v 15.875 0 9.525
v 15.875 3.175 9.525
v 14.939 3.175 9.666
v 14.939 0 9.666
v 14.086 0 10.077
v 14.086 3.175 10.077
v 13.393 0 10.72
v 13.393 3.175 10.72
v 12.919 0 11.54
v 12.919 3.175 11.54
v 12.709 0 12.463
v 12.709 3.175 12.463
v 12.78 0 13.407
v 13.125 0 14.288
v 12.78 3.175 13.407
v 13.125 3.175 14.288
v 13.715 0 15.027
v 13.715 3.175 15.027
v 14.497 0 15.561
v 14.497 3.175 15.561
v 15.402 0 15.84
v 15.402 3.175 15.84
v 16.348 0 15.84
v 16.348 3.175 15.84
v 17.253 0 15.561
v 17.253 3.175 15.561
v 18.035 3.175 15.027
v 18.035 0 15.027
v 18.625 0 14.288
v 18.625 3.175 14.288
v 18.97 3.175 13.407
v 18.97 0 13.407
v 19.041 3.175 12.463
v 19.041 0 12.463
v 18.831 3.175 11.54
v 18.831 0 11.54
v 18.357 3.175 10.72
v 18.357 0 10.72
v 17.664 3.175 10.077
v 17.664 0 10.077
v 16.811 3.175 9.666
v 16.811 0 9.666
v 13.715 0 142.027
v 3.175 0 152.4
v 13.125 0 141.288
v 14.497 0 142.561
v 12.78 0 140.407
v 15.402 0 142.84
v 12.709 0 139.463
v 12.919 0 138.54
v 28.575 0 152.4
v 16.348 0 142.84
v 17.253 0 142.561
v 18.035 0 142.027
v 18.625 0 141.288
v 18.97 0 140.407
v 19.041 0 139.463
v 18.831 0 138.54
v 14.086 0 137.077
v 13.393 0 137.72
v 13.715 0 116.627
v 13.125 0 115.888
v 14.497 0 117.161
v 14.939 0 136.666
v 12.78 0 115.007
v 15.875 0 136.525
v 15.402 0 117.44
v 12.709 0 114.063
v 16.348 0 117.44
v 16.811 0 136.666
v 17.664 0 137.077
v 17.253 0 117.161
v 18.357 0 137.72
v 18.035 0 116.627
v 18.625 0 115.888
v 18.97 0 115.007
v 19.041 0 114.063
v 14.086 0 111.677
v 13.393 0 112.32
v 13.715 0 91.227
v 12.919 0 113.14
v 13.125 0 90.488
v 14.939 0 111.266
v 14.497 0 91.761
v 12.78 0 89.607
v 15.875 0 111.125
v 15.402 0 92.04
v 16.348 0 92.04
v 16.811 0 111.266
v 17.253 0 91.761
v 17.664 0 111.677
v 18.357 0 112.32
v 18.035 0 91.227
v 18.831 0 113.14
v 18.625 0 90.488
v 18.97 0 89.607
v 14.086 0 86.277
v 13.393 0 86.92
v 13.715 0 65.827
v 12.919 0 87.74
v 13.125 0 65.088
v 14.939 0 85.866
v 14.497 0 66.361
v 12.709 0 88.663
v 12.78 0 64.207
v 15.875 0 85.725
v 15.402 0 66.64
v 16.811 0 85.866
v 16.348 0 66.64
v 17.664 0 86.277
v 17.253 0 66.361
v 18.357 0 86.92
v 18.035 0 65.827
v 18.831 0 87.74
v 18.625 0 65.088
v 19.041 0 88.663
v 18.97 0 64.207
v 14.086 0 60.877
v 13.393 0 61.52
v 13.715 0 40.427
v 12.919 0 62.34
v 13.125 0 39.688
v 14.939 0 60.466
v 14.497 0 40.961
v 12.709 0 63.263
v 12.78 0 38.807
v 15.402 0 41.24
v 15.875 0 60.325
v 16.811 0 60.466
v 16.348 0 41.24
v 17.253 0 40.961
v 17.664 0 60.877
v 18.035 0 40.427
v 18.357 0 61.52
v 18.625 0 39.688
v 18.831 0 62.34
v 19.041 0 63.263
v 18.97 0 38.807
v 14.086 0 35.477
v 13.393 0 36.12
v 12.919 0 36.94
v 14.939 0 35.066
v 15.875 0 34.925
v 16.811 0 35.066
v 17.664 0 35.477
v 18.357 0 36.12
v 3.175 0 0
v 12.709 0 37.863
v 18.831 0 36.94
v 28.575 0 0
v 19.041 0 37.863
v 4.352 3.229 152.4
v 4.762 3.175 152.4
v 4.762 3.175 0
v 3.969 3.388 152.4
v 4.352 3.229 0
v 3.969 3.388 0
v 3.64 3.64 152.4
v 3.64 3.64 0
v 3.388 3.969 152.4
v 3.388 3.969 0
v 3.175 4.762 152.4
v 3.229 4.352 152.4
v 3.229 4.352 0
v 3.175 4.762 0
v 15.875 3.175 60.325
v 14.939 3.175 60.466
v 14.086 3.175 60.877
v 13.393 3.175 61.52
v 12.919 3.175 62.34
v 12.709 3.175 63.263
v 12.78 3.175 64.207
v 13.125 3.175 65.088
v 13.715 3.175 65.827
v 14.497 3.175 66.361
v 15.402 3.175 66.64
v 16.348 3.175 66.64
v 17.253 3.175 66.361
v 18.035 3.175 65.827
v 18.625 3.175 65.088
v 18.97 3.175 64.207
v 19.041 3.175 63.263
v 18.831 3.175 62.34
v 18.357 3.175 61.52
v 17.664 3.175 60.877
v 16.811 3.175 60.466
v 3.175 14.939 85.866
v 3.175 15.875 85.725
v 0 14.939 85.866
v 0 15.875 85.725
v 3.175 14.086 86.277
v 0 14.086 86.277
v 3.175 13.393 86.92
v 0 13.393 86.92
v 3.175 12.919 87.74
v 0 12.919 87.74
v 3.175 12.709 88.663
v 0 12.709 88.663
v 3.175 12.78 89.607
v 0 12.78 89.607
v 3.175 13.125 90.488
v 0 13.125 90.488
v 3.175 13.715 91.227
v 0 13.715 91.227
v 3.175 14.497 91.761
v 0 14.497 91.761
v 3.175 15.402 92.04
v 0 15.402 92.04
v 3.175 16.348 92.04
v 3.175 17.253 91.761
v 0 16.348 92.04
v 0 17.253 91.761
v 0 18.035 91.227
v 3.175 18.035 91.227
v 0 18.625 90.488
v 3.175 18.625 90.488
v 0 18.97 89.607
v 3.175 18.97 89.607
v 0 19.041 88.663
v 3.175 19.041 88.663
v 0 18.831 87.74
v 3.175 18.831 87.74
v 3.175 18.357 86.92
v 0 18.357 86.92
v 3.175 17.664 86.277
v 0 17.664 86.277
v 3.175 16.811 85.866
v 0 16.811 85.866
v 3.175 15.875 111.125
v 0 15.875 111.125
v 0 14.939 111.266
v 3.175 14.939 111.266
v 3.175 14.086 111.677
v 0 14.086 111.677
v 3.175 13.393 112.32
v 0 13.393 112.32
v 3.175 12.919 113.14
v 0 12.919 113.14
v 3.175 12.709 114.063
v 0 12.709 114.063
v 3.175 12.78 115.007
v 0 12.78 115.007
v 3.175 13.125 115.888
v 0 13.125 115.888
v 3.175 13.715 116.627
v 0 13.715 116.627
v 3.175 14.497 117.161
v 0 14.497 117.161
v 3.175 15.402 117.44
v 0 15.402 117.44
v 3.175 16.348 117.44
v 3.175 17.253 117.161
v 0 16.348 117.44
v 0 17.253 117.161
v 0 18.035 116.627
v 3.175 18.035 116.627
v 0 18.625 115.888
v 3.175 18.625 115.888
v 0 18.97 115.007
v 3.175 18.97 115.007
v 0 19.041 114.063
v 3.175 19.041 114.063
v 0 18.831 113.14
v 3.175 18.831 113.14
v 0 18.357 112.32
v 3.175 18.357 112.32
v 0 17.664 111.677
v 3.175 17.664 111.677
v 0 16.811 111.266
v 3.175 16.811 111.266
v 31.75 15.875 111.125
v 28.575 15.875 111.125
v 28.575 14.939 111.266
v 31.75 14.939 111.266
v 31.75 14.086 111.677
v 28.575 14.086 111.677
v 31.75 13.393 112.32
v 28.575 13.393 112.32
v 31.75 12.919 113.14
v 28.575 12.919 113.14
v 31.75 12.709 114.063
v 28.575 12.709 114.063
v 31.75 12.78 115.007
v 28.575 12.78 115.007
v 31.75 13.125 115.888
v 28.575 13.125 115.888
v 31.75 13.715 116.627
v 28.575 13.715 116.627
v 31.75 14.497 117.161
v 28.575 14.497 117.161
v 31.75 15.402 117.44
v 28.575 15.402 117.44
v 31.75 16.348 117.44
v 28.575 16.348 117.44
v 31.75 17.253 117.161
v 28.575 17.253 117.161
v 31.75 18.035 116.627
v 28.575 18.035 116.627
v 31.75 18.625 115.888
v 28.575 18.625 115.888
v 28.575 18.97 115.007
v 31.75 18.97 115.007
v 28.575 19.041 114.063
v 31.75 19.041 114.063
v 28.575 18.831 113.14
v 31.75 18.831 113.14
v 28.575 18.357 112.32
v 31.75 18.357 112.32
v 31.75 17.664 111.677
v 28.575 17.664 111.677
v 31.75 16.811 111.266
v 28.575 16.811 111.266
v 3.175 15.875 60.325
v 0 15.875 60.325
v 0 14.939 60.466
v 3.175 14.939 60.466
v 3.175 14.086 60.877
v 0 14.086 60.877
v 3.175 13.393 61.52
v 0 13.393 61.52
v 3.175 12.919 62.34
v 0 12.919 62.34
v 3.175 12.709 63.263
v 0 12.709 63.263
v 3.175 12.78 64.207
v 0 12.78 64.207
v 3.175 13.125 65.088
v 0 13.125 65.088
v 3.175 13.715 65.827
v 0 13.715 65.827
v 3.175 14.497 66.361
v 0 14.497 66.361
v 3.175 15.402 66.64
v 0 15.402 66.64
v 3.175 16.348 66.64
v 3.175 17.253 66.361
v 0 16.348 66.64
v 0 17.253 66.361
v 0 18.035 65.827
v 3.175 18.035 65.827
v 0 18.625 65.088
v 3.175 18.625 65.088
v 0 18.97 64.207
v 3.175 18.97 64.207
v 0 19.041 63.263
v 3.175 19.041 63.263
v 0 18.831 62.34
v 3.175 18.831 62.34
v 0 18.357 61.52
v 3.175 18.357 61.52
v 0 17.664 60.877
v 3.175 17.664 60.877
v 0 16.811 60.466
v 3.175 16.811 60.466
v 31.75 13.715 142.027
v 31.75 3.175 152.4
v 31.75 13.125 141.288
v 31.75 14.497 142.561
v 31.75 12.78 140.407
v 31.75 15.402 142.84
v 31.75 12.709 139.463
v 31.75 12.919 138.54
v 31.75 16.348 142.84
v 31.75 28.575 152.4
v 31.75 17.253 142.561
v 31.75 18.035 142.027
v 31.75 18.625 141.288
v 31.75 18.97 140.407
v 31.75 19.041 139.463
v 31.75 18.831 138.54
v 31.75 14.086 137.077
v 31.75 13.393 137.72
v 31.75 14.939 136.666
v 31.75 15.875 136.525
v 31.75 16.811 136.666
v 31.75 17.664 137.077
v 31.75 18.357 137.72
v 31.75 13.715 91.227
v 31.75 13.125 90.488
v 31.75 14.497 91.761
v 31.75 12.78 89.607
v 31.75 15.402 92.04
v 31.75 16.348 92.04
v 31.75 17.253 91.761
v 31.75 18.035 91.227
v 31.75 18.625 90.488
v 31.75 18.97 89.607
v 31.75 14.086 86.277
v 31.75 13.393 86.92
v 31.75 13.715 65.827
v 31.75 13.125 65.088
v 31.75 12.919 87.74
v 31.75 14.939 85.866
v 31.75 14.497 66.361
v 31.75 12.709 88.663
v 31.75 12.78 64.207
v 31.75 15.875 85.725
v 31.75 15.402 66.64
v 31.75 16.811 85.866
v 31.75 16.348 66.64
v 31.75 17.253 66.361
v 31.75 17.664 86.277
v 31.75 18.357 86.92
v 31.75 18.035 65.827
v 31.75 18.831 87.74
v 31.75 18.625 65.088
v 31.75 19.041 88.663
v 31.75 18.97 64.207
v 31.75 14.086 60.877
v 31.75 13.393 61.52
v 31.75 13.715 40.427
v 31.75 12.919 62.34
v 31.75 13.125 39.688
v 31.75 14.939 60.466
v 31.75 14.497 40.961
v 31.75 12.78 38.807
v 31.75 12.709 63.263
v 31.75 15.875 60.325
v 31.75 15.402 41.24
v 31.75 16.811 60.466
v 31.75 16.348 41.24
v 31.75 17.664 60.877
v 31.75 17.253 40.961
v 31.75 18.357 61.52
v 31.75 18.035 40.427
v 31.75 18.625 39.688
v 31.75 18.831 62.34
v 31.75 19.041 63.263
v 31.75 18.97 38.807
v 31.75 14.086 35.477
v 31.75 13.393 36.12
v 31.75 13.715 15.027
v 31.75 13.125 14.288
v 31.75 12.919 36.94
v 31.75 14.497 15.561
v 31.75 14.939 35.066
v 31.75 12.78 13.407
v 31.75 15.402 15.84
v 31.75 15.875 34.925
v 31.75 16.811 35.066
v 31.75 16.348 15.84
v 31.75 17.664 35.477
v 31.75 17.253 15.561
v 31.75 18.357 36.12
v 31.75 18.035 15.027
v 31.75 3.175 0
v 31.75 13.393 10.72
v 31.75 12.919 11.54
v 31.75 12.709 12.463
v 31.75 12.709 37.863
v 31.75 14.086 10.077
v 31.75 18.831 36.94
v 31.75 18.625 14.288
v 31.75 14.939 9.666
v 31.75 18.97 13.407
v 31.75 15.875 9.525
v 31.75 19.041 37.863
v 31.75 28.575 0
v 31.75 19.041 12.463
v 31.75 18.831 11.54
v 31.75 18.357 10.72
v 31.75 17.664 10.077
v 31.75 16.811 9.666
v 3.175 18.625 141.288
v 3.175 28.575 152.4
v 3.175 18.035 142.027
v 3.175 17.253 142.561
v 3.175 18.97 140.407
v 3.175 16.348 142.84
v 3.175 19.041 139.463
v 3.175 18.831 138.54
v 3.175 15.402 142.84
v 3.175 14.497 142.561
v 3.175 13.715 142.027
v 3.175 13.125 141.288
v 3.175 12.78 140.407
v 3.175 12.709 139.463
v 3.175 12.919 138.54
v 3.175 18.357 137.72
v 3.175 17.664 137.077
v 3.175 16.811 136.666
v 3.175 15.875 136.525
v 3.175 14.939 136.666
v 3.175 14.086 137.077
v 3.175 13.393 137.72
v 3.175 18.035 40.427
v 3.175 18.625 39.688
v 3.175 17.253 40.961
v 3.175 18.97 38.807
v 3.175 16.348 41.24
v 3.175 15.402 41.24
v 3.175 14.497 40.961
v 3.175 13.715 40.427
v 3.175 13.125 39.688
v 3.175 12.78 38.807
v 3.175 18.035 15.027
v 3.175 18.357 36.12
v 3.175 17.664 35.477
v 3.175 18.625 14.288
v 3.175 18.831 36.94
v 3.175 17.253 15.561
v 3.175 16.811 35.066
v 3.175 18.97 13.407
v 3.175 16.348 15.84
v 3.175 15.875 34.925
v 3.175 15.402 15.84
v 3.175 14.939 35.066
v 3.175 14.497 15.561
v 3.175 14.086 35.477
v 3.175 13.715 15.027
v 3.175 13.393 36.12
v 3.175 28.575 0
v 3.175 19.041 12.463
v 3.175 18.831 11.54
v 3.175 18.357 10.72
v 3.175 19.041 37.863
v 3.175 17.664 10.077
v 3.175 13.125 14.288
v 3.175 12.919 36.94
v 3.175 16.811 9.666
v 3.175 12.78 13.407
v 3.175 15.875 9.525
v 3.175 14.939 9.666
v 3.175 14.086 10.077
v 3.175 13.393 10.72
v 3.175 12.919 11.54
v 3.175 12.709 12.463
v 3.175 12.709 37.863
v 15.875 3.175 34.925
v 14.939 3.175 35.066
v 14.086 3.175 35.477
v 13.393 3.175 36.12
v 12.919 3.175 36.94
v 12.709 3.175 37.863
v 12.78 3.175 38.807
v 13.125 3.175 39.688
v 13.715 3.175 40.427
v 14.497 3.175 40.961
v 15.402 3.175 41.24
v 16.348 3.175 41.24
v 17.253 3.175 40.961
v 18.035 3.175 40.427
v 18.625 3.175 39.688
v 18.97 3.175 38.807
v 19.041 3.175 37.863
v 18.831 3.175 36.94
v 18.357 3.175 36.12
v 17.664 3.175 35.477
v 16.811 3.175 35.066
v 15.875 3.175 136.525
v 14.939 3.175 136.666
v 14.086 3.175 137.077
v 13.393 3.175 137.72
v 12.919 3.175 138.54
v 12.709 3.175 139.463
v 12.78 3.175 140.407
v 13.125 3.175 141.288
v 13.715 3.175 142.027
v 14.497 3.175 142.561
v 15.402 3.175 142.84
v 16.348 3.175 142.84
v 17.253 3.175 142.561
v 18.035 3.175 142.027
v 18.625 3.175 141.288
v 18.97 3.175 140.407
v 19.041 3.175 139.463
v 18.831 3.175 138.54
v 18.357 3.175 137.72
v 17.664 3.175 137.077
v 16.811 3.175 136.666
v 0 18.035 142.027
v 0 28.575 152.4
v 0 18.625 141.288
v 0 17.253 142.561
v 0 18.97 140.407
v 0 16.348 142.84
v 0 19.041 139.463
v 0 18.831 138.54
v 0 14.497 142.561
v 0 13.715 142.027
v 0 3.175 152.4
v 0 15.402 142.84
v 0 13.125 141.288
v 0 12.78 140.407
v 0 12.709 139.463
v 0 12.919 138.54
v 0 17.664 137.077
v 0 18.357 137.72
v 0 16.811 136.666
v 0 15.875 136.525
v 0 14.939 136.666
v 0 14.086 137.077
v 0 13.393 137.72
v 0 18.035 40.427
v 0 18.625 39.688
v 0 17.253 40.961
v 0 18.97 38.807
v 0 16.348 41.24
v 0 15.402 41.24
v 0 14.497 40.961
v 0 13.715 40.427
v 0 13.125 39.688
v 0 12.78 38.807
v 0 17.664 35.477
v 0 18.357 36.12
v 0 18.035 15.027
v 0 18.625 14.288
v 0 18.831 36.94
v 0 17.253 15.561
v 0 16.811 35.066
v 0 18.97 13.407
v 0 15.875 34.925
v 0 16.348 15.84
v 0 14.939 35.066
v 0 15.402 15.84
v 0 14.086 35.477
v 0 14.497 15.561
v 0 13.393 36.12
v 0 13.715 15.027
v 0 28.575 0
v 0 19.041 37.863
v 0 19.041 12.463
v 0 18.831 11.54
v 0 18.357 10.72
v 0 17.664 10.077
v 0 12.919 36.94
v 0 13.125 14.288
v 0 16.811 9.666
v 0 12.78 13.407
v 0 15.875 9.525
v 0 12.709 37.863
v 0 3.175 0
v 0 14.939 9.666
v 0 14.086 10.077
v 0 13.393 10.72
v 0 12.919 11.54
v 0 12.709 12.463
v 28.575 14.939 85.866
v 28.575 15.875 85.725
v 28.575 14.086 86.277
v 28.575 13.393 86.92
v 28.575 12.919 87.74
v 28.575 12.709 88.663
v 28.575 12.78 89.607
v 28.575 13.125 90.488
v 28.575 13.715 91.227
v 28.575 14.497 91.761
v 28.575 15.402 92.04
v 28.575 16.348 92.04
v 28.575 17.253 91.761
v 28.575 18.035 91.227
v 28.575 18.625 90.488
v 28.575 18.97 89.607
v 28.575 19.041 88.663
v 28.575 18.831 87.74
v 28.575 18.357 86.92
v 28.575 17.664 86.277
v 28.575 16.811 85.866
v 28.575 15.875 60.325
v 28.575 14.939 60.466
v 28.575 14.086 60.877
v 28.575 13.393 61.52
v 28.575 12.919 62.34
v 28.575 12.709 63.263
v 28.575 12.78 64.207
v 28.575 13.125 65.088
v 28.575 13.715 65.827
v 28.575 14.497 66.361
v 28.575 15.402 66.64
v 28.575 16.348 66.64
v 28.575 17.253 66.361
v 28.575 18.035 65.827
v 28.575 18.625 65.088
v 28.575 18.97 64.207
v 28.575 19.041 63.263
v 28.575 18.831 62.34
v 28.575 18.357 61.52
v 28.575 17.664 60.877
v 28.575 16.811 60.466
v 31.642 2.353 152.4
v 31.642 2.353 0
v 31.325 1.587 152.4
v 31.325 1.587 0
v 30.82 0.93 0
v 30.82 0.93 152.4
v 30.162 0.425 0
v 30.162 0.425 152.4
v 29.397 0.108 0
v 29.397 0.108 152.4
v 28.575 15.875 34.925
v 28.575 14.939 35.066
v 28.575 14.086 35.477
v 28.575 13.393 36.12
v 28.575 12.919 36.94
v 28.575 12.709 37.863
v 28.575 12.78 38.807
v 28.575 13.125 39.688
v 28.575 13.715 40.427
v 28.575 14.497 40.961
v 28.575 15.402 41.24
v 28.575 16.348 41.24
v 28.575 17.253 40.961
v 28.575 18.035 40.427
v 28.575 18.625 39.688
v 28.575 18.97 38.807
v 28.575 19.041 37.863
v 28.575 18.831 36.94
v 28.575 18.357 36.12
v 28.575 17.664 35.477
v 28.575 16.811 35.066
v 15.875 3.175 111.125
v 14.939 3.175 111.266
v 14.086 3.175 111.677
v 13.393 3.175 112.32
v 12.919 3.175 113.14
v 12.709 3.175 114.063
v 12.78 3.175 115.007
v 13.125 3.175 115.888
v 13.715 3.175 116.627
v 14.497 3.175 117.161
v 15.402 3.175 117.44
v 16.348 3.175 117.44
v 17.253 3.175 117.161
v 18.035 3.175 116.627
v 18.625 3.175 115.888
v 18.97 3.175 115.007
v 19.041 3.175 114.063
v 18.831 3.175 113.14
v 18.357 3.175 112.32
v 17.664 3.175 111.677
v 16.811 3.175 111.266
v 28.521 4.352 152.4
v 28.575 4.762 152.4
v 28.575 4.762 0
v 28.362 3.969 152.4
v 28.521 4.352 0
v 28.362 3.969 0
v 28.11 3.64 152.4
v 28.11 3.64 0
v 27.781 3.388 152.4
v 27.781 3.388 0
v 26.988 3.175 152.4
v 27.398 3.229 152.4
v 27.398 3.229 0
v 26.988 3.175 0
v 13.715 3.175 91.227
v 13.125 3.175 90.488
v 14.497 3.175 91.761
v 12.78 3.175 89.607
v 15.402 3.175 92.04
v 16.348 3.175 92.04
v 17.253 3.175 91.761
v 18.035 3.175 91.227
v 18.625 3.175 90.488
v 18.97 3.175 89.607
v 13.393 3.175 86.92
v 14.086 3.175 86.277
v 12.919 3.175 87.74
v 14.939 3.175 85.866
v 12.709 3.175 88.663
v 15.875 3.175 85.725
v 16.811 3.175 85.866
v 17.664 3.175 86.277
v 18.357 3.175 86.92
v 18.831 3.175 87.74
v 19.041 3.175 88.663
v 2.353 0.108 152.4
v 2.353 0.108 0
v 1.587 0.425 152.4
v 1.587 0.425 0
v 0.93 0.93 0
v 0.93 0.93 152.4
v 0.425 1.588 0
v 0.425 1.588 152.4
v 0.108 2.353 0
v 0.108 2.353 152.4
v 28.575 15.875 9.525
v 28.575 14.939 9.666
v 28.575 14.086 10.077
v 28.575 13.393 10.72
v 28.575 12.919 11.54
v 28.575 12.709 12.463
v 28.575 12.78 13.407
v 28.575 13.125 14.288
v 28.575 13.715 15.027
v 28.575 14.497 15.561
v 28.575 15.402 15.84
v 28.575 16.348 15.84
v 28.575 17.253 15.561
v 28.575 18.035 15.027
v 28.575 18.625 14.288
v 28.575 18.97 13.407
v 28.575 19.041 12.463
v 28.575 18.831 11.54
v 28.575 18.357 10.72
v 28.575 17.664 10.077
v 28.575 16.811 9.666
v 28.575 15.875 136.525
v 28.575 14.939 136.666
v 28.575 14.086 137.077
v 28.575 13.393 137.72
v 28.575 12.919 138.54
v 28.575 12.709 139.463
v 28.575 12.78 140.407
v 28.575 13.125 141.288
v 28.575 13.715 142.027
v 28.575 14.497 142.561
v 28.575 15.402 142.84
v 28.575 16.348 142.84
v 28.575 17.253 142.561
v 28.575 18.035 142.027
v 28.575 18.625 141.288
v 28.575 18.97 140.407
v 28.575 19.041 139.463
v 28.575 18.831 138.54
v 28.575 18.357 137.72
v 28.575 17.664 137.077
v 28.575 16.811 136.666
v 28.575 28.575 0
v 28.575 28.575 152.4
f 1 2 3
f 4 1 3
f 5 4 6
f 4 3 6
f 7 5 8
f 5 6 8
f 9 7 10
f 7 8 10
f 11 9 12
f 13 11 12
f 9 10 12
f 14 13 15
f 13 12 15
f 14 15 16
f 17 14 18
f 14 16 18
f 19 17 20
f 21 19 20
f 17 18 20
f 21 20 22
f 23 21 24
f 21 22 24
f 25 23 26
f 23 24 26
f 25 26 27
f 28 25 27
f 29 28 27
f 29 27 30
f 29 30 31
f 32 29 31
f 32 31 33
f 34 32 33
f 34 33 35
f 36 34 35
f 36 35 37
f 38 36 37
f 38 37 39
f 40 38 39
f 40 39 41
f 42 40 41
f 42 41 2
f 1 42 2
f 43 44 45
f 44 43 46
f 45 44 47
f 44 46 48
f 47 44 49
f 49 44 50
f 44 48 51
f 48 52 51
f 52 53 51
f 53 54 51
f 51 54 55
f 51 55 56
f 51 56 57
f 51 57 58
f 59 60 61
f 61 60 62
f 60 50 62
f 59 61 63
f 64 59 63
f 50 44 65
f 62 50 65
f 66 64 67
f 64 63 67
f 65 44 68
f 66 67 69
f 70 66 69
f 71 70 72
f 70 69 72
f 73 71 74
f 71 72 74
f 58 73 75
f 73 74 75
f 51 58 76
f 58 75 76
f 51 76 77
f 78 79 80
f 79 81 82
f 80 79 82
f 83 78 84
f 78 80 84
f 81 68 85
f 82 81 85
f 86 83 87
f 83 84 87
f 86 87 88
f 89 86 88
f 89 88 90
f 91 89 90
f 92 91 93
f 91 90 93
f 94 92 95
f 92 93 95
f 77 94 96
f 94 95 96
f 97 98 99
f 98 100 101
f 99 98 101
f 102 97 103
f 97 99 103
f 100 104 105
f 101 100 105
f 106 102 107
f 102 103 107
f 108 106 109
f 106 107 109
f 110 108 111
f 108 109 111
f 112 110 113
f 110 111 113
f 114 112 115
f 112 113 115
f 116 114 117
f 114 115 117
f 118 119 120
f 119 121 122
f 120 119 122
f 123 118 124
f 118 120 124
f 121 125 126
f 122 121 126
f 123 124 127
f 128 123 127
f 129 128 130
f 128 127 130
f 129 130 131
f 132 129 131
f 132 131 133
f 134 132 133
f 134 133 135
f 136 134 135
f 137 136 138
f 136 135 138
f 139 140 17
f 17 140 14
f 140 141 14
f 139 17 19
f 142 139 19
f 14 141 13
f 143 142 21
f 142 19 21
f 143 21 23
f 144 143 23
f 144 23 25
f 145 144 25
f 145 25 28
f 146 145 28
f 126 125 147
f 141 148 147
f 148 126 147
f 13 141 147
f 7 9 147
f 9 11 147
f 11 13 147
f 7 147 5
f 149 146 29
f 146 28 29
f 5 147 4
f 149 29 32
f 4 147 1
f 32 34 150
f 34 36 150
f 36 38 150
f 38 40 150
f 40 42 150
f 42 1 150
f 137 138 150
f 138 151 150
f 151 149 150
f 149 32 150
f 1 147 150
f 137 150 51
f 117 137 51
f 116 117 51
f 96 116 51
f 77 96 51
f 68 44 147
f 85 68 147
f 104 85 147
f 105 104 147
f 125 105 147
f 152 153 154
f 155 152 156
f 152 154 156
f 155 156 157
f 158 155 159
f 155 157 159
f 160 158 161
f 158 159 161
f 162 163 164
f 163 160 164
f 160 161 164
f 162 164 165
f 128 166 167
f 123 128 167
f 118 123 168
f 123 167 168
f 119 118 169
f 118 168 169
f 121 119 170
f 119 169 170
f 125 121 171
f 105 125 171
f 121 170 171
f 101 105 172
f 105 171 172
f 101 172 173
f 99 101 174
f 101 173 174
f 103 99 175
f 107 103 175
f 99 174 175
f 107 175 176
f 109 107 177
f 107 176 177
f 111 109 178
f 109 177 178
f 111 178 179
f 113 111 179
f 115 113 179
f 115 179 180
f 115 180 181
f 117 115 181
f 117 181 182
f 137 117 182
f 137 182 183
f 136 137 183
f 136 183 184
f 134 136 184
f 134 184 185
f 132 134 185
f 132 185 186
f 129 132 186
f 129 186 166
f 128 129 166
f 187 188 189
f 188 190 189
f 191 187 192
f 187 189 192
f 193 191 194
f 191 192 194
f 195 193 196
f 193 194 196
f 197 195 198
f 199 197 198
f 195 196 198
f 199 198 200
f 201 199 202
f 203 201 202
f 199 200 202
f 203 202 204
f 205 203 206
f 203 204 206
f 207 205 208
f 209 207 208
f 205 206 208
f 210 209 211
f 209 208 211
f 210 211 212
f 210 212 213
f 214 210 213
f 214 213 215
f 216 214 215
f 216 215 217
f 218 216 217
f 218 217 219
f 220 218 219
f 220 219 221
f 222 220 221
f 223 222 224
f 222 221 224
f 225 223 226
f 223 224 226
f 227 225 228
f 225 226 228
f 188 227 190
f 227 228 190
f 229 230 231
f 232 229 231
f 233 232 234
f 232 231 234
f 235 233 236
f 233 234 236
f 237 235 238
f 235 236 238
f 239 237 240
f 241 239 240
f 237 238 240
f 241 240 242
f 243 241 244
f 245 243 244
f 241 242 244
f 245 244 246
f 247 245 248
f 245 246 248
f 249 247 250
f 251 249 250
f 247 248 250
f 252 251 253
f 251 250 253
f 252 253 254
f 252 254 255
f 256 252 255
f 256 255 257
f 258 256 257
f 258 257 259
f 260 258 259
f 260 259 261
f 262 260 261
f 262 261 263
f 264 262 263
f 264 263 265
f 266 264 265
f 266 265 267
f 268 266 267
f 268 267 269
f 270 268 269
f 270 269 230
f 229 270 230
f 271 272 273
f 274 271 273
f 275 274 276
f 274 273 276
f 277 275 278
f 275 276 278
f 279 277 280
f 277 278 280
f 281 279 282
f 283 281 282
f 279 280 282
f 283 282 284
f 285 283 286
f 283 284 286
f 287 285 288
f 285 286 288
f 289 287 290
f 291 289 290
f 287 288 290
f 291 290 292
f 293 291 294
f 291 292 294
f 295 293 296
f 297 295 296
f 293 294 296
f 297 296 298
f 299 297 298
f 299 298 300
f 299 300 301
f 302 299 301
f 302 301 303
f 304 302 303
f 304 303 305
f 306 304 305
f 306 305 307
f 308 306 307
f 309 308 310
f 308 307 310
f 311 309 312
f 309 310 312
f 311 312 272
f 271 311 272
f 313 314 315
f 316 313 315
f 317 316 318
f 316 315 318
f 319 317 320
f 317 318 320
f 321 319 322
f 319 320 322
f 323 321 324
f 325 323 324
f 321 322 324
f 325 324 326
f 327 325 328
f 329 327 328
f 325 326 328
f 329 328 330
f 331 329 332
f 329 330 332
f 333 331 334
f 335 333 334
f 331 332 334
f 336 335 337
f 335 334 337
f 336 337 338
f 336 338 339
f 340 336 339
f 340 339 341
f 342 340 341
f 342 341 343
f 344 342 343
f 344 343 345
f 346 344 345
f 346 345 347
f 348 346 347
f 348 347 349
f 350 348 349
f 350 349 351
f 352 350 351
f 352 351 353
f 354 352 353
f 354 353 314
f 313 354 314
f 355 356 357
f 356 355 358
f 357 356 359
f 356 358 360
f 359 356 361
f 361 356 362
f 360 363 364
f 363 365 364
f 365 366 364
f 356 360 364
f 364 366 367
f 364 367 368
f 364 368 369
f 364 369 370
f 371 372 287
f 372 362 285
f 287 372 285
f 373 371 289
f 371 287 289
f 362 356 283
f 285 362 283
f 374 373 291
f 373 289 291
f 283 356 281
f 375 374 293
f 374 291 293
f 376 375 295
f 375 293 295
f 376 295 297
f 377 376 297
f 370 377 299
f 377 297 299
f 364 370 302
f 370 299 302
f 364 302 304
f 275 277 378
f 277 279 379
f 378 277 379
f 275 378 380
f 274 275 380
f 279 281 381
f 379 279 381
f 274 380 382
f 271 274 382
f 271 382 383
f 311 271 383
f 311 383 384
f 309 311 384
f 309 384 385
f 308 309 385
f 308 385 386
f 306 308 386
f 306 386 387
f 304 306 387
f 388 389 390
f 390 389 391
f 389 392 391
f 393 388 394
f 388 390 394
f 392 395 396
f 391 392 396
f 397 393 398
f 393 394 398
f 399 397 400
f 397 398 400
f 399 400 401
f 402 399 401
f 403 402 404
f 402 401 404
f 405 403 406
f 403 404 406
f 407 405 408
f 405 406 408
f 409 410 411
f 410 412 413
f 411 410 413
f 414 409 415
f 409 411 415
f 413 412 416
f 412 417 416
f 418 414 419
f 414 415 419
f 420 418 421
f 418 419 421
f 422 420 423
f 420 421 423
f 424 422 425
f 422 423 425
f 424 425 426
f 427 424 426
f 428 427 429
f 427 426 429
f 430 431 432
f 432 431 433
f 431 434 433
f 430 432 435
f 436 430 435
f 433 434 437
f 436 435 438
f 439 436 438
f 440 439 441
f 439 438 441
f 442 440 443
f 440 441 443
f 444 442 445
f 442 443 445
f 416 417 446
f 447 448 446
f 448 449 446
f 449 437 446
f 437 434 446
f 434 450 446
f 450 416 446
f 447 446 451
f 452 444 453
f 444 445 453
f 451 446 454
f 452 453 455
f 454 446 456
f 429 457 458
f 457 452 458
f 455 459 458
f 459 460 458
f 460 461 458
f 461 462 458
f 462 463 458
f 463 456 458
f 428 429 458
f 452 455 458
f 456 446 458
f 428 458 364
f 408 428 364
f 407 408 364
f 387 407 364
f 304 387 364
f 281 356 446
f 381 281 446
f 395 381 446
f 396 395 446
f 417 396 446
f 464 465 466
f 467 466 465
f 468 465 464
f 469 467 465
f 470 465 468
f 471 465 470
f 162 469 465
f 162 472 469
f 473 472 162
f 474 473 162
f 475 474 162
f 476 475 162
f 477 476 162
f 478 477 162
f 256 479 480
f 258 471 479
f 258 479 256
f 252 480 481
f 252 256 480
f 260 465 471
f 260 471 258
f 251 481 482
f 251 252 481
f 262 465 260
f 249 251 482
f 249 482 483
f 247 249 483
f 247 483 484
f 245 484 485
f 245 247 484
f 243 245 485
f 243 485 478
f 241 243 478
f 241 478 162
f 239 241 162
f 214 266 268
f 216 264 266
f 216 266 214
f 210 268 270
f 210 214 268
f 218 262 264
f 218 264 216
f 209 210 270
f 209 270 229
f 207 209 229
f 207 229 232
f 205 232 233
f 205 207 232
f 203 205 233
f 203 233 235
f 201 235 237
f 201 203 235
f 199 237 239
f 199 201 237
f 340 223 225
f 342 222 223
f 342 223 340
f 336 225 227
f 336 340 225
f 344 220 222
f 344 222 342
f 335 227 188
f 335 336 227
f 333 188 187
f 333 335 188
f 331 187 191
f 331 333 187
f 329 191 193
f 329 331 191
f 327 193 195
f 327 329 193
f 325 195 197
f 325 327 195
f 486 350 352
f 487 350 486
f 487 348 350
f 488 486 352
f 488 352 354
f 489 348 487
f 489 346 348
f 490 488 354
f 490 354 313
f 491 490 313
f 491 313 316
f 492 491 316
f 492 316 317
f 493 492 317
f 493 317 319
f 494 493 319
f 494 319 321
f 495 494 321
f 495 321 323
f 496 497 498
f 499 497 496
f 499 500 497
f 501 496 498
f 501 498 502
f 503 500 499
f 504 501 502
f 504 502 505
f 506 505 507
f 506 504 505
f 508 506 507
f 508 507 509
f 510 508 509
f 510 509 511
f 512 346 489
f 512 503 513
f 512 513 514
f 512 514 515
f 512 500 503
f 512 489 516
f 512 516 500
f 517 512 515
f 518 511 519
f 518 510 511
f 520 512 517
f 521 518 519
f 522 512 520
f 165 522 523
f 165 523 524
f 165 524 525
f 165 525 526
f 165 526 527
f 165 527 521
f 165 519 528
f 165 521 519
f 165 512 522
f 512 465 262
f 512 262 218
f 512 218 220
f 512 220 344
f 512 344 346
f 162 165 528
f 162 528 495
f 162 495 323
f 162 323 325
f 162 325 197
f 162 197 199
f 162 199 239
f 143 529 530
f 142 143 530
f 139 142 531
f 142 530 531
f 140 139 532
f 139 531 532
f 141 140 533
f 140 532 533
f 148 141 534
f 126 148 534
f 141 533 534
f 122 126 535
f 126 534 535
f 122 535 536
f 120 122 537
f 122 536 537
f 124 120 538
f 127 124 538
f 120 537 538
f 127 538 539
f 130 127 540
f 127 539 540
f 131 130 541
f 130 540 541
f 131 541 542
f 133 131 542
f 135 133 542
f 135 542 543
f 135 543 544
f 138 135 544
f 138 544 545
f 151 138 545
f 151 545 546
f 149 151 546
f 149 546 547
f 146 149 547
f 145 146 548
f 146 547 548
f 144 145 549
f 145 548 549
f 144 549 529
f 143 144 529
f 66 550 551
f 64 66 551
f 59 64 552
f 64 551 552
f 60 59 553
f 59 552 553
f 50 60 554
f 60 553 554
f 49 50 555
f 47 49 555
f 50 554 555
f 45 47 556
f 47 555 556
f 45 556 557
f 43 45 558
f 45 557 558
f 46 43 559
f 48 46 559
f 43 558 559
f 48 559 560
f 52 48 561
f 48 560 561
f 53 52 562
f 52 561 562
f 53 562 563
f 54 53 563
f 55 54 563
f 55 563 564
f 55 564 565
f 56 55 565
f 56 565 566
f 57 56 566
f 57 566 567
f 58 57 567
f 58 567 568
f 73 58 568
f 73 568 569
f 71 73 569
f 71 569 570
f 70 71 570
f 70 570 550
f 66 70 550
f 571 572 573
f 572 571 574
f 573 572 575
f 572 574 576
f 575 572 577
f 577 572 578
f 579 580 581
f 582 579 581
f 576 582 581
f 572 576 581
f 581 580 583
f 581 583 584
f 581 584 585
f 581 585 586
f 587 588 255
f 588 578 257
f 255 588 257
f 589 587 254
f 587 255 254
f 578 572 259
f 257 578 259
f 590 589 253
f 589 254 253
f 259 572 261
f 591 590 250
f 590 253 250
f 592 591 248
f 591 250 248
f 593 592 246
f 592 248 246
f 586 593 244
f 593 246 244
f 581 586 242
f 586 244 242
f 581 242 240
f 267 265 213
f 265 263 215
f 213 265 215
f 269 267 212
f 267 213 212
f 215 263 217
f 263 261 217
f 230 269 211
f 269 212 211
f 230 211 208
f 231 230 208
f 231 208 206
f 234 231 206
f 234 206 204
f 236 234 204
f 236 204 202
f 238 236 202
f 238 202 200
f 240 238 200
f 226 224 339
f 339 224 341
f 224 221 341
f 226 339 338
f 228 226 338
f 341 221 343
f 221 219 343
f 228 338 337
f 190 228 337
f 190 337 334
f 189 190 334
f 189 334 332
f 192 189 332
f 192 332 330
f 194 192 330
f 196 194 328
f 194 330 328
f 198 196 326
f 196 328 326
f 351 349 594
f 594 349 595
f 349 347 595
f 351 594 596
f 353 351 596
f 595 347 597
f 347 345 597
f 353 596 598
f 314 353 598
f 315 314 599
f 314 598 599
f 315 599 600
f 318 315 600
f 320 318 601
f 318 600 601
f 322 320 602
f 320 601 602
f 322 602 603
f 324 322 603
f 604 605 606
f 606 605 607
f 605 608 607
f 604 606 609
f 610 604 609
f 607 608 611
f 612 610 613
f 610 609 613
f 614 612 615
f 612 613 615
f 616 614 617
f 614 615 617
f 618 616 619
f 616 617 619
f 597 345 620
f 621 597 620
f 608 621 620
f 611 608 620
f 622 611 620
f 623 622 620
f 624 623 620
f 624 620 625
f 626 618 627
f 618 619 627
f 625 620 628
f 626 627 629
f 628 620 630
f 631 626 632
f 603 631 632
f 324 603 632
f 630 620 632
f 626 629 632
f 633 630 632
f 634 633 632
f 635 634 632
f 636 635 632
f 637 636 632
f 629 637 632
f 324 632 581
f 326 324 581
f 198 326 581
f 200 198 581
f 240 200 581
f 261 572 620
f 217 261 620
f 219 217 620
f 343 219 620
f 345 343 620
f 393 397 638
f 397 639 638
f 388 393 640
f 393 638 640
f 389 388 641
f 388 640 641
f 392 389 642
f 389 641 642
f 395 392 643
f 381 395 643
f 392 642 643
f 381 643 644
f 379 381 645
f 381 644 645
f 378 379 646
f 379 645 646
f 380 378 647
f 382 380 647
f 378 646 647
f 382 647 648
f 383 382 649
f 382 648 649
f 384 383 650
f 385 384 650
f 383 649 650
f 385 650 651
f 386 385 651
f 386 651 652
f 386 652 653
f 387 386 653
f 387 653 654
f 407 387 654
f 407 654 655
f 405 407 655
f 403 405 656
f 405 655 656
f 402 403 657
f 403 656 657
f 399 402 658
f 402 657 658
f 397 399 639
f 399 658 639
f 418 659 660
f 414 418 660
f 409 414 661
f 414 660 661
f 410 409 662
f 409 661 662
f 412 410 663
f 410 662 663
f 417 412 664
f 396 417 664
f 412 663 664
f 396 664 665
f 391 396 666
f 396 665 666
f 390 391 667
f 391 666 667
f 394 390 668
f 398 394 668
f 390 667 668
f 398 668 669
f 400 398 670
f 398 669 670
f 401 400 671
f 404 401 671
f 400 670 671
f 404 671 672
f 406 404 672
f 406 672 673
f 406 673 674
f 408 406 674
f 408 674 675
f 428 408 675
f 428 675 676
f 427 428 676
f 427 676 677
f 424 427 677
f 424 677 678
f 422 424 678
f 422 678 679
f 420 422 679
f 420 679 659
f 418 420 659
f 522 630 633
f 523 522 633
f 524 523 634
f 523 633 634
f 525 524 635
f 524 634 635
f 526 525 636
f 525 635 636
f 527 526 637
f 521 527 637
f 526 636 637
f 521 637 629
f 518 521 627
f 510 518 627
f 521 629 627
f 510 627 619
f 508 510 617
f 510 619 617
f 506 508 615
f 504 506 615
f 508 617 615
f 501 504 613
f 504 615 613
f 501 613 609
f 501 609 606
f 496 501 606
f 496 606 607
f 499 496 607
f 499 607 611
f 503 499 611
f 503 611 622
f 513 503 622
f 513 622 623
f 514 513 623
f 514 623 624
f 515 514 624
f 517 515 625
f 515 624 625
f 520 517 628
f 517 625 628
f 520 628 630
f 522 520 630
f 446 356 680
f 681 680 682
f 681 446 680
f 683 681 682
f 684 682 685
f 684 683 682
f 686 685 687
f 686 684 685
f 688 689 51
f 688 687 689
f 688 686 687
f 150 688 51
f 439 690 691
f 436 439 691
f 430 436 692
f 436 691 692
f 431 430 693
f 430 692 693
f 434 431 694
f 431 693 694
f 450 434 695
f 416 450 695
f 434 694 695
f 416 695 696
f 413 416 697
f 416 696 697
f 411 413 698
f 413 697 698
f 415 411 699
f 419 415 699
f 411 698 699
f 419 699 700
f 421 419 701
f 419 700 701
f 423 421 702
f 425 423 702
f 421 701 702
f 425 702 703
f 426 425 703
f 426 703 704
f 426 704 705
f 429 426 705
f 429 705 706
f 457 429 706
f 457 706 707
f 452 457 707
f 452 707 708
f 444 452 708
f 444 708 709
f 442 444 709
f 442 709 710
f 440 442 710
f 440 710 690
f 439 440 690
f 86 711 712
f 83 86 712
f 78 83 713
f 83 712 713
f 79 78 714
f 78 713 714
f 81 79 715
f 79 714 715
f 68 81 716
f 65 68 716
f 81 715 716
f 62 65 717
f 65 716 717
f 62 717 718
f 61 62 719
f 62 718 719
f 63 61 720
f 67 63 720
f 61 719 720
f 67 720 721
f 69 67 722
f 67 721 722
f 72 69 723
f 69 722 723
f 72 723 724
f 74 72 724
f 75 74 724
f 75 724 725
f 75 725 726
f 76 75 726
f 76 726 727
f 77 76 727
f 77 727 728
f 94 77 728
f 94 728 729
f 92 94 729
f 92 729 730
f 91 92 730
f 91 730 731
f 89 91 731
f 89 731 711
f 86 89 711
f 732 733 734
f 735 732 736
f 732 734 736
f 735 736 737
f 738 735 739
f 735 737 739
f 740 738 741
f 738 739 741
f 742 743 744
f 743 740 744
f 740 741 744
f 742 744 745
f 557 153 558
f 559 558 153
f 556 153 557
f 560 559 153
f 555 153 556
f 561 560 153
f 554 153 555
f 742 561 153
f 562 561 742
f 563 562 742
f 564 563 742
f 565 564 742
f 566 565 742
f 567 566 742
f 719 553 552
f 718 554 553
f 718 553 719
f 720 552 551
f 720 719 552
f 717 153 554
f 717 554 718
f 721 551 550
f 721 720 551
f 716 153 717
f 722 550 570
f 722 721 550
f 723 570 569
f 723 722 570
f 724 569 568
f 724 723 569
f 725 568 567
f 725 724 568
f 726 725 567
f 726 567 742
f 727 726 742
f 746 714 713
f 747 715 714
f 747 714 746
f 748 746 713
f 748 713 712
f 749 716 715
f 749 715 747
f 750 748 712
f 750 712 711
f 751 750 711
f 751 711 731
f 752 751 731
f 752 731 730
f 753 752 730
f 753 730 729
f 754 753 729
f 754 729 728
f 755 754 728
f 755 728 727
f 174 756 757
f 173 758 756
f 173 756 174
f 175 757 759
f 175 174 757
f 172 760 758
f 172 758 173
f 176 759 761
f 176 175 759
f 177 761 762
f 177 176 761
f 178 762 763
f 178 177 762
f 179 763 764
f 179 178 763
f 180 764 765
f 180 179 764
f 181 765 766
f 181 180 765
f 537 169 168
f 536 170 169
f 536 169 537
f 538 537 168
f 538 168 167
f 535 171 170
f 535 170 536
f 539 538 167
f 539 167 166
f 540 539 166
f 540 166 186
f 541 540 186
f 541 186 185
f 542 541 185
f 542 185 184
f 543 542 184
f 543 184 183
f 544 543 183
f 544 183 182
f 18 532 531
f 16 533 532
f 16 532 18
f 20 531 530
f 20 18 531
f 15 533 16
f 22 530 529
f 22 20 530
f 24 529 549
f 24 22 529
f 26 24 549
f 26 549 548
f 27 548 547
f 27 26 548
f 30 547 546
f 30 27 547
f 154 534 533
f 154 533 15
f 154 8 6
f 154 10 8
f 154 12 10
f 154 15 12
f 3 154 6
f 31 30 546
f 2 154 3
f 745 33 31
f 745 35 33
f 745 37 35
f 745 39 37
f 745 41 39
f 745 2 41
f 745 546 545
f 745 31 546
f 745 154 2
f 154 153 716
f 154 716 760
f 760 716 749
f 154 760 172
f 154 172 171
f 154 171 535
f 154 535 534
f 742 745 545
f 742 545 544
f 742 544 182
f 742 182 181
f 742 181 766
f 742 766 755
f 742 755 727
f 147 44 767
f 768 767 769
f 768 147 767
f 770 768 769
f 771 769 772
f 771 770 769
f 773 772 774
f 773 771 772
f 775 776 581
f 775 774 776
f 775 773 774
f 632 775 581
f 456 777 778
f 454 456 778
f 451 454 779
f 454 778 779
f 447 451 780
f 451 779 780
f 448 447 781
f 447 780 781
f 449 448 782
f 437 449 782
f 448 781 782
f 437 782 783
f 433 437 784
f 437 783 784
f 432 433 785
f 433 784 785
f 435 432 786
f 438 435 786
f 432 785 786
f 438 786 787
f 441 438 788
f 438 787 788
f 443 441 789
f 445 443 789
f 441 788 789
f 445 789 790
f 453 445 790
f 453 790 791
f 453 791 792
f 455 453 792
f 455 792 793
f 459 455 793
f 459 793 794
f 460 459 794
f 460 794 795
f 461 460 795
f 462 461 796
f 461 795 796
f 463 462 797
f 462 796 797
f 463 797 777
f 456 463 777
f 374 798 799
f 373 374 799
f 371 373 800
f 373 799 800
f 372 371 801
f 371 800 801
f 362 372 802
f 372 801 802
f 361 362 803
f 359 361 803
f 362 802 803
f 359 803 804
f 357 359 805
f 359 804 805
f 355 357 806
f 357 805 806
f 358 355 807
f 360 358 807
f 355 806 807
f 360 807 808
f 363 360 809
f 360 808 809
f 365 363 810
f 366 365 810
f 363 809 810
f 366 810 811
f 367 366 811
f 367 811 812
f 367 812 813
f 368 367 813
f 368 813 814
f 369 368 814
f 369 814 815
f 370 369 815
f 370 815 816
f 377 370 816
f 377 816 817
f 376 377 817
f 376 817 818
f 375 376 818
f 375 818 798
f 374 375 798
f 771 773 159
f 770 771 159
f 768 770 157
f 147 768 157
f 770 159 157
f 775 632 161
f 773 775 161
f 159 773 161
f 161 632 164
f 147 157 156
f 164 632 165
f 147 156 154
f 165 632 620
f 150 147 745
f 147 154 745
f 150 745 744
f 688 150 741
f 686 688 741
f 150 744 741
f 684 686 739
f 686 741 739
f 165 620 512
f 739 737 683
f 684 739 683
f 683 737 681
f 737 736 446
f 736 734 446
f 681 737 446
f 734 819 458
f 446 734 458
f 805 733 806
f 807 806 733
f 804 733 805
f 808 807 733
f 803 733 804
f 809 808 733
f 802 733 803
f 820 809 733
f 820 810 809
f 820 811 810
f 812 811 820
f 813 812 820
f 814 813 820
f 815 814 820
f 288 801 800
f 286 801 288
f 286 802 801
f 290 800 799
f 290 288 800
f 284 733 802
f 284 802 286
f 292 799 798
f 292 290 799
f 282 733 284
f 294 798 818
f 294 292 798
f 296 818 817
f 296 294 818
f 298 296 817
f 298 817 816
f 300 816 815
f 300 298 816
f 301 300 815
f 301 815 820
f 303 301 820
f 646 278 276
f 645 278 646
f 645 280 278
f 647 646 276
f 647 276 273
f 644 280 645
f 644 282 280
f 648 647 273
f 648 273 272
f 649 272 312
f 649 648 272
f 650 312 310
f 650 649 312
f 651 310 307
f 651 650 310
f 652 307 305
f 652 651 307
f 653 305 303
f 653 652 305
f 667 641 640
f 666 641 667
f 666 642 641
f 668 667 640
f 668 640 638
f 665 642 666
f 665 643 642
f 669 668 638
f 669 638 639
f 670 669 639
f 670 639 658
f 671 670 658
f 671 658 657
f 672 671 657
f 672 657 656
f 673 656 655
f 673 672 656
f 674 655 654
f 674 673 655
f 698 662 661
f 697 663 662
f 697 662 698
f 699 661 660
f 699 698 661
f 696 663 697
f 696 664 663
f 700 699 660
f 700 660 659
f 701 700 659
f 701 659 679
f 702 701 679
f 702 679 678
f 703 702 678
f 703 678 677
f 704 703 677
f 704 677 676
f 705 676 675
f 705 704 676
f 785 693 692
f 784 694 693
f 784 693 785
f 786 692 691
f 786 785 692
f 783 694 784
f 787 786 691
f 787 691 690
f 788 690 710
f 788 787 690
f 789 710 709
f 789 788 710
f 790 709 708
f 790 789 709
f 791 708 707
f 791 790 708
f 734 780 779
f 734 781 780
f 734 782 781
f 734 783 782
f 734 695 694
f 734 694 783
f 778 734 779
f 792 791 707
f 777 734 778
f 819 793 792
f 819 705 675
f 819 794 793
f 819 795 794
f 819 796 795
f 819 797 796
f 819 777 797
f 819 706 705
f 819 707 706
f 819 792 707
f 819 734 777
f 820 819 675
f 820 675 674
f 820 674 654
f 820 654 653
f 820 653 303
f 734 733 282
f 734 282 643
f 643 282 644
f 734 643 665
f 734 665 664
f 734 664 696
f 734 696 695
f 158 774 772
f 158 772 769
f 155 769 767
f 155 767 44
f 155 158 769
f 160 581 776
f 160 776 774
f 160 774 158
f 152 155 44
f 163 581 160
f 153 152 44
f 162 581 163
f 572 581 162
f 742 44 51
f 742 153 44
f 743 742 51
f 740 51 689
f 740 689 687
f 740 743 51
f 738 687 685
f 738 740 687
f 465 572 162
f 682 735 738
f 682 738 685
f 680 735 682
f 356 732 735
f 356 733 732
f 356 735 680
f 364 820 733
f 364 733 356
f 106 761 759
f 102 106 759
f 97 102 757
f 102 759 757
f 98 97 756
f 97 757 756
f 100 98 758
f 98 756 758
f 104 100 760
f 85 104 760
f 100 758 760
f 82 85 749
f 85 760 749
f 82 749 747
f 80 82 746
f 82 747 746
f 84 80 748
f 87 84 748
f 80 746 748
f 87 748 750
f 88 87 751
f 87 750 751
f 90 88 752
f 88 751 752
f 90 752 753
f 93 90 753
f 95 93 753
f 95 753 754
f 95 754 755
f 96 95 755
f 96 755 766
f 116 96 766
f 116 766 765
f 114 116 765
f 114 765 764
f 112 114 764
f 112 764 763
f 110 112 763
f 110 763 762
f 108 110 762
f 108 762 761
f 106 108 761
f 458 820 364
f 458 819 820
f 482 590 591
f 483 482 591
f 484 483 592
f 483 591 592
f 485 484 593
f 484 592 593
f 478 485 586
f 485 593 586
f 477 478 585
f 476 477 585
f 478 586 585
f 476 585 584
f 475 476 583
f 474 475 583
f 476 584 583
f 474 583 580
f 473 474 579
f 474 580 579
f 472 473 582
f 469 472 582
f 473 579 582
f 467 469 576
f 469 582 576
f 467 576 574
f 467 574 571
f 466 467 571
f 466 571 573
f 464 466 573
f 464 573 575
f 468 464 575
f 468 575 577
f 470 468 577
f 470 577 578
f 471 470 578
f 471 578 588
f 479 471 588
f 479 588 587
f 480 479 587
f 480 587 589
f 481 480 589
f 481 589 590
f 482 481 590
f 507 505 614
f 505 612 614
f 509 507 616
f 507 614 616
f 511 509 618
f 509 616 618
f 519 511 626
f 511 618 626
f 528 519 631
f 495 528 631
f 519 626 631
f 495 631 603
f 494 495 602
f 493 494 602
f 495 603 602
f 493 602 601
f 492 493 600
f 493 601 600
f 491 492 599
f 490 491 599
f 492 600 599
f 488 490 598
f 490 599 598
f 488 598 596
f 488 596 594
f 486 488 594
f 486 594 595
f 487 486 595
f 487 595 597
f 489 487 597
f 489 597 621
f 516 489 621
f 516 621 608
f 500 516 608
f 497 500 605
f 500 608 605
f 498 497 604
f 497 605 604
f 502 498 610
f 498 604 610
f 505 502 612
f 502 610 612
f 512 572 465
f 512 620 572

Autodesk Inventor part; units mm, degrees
ref_plane "YZ Plane" through (0, 0, 0) normal (1, 0, 0) x (0, 1, 0)
ref_plane "XZ Plane" through (0, 0, 0) normal (0, 1, 0) x (-1, 0, 0)
ref_plane "XY Plane" through (0, 0, 0) normal (0, 0, 1) x (1, 0, 0)
sketch "Sketch1" plane through (0, 0, 0) normal (0, 0, 1) x (1, 0, 0)
  line L0 (3.175, 0) -> (28.575, 0)
  line L1 (31.75, 3.175) -> (31.75, 28.575)
  line L2 (0, 28.575) -> (0, 3.175)
  line L3 (4.7625, 3.175) -> (26.9875, 3.175)
  line L4 (28.575, 4.7625) -> (28.575, 28.575)
  line L5 (3.175, 28.575) -> (3.175, 4.7625)
  line L6 (0, 28.575) -> (3.175, 28.575)
  line L7 (28.575, 28.575) -> (31.75, 28.575)
  arc A0 (3.175, 4.7625) -> (4.7625, 3.175) centre (4.7625, 4.7625) ccw
  arc A1 (26.9875, 3.175) -> (28.575, 4.7625) centre (26.9875, 4.7625) ccw
  arc A2 (0, 3.175) -> (3.175, 0) centre (3.175, 3.175) ccw
  arc A3 (28.575, 0) -> (31.75, 3.175) centre (28.575, 3.175) ccw
  point P0 (0, 0)
  point P1 (0, 0)
  point P2 (31.75, 0)
  dimension "d0" = 31.75
  dimension "d1" = 28.575
  dimension "d2" = 1.5875
  dimension "d3" = 3.175
extrude "Extrusion1" add sketch "Sketch1" along normal blind 152.4
sketch "Sketch2" plane through (31.75, 3.175, 0) normal (1, 0, 0) x (0, 0, -1)
  line L0 (-152.4, 0) -> (-152.4, 25.4) projected
  line L1 (0, 0) -> (-152.4, 0) projected
  line L2 (-152.4, 12.7) -> (-139.7, 12.7)
  point P0 (0, -3.175)
  dimension "d6" = 12.7
sketch "Sketch3" plane through (3.175, 0, 0) normal (0, -1, 0) x (1, 0, 0)
  line L0 (0, 152.4) -> (25.4, 152.4) projected
  line L1 (0, 0) -> (0, 152.4) projected
  line L2 (12.7, 152.4) -> (12.7, 139.7)
  point P0 (-3.175, 0)
  dimension "d7" = 12.7
hole "Hole1" at (31.75, 15.875, 139.7) direction (-1, 0, 0) diameter 6.35 end through all
hole "Hole2" at (15.875, 0, 139.7) direction (0, 1, 0) diameter 6.35 end through all
pattern_linear "Rectangular Pattern1" count 6 spacing 25.4 along (0, 0, -1) of "Hole1", "Hole2"
properties part number "6 in bar"
